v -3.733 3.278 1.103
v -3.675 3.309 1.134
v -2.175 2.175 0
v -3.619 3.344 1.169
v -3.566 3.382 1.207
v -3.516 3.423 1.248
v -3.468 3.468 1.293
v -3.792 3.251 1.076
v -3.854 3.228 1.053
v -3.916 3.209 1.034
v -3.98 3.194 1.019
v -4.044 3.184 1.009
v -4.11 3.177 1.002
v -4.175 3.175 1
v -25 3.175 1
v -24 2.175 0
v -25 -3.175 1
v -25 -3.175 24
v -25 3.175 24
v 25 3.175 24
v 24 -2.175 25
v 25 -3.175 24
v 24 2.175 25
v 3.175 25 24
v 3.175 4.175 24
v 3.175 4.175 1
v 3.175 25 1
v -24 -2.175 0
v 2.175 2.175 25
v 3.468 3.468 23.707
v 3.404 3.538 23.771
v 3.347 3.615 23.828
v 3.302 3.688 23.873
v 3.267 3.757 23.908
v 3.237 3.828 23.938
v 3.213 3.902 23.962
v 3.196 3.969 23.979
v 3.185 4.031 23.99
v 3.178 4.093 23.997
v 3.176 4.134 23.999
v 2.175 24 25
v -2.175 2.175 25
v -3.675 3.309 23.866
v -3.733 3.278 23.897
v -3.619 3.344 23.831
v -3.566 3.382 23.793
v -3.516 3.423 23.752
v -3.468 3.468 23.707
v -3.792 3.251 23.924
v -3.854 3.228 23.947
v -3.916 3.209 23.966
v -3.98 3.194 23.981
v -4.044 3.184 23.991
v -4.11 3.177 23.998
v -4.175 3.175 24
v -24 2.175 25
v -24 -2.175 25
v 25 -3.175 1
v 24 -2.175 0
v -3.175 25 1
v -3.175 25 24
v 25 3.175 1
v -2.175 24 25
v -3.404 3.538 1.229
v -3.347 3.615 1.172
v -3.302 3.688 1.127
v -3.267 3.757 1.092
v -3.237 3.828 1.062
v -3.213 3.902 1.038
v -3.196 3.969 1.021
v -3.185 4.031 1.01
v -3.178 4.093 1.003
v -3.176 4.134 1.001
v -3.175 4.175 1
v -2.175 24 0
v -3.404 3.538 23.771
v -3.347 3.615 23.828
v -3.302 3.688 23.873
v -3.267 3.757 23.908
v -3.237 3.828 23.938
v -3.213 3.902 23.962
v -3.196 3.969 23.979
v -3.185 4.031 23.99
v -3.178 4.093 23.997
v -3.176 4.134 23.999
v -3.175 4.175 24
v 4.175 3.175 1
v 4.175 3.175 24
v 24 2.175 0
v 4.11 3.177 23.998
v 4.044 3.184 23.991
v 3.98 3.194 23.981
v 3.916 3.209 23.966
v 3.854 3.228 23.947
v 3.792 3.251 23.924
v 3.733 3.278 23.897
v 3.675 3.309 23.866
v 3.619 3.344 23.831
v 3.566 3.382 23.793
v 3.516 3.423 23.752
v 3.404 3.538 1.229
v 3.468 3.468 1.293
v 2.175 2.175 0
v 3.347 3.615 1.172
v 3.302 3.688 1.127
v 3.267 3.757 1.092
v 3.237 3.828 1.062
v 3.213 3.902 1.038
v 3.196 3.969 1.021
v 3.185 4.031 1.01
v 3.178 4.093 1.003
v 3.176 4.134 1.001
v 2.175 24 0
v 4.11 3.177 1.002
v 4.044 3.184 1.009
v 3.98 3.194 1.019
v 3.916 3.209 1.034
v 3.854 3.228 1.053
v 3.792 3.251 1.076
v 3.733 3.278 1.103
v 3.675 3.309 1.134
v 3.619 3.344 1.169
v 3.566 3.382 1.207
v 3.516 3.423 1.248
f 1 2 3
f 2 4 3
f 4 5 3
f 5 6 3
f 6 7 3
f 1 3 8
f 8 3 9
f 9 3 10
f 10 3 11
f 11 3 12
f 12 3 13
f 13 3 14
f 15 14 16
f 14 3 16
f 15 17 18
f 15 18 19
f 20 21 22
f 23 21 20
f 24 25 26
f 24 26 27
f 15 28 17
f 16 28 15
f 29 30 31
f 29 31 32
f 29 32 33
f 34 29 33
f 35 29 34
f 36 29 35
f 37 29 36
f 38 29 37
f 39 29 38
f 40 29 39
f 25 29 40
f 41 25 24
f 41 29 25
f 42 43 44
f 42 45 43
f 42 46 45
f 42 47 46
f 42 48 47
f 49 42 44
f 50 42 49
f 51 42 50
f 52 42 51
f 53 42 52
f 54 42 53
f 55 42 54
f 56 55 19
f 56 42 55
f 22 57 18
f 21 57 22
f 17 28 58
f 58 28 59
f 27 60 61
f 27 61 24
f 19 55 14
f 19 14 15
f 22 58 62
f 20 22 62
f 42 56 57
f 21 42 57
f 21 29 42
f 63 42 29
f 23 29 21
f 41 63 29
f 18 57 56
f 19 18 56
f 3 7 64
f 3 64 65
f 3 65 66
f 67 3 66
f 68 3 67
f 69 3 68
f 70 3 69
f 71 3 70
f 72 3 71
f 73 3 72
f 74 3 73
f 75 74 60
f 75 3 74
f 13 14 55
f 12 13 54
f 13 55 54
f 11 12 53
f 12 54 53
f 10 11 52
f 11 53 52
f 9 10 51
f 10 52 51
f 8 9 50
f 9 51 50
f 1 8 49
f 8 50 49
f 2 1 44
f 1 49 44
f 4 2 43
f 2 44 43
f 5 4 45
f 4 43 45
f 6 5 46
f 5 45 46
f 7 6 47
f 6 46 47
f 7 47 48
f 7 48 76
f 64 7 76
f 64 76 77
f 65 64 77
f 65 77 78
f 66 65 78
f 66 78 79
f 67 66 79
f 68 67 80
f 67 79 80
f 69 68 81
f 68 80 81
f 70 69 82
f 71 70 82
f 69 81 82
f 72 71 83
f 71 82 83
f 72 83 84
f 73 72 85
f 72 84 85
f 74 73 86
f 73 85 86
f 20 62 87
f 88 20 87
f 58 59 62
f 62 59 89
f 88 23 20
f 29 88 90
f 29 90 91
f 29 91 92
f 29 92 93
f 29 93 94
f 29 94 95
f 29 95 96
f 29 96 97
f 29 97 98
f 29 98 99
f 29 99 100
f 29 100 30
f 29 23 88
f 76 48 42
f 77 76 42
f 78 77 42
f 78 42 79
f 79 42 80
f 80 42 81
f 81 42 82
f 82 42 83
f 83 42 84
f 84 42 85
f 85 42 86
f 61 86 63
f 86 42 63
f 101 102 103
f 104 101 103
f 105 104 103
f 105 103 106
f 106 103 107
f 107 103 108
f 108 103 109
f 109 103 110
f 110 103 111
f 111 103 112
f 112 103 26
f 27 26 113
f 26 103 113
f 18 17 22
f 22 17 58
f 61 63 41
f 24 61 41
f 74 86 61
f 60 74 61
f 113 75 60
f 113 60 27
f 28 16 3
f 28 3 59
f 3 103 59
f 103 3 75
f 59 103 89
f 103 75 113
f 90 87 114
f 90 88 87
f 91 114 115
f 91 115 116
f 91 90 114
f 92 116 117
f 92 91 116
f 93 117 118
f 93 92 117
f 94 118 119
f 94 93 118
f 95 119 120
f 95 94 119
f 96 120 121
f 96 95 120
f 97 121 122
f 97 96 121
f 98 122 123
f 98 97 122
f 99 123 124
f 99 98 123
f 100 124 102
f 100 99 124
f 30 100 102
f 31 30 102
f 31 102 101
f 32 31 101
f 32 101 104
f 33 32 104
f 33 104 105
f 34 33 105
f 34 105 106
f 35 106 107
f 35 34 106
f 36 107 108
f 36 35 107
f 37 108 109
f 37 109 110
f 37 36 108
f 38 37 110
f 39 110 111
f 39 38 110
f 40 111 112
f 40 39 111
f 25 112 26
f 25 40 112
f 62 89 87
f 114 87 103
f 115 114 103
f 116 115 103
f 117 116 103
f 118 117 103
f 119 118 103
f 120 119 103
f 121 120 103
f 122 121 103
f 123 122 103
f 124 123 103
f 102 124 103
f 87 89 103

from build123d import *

# Parameters (mm, degrees)
F0_W     = 21.825
F0_H     = 6.35
F0_W_2   = 6.35
F0_H_2   = 21.825
F1_DEPTH = 25
F2_SIZE  = 1
F3_R     = 1


with BuildPart() as f1:
    # F0 (on Top) → F1 (new body)
    with BuildSketch(Plane.XY):
        with Locations((-14.0875, 0)):
            Rectangle(F0_W, F0_H)
        Rectangle(F0_W_2, F0_H)
        with Locations((14.0875, 0)):
            Rectangle(F0_W, F0_H)
        with Locations((0, 14.0875)):
            Rectangle(F0_W_2, F0_H_2)
    extrude(amount=F1_DEPTH)

    # F2
    f2_edges = [f1.edges().sort_by_distance(p)[0] for p in [
        (-25, 0, 0),
        (0, -3.175, 0),
        (25, 0, 0),
        (14.0875, 3.175, 0),
        (3.175, 14.0875, 0),
        (0, 25, 0),
        (-3.175, 14.0875, 0),
        (-14.0875, 3.175, 0),
        (-25, 0, 25),
        (0, -3.175, 25),
        (25, 0, 25),
        (14.0875, 3.175, 25),
        (3.175, 14.0875, 25),
        (0, 25, 25),
        (-3.175, 14.0875, 25),
        (-14.0875, 3.175, 25),
    ]]
    chamfer(f2_edges, length=F2_SIZE)

    # F3
    f3_edges = [f1.edges().sort_by_distance(p)[0] for p in [
        (3.175, 3.175, 12.5),
        (-3.175, 3.175, 12.5),
    ]]
    fillet(f3_edges, radius=F3_R)


solid = f1.part
